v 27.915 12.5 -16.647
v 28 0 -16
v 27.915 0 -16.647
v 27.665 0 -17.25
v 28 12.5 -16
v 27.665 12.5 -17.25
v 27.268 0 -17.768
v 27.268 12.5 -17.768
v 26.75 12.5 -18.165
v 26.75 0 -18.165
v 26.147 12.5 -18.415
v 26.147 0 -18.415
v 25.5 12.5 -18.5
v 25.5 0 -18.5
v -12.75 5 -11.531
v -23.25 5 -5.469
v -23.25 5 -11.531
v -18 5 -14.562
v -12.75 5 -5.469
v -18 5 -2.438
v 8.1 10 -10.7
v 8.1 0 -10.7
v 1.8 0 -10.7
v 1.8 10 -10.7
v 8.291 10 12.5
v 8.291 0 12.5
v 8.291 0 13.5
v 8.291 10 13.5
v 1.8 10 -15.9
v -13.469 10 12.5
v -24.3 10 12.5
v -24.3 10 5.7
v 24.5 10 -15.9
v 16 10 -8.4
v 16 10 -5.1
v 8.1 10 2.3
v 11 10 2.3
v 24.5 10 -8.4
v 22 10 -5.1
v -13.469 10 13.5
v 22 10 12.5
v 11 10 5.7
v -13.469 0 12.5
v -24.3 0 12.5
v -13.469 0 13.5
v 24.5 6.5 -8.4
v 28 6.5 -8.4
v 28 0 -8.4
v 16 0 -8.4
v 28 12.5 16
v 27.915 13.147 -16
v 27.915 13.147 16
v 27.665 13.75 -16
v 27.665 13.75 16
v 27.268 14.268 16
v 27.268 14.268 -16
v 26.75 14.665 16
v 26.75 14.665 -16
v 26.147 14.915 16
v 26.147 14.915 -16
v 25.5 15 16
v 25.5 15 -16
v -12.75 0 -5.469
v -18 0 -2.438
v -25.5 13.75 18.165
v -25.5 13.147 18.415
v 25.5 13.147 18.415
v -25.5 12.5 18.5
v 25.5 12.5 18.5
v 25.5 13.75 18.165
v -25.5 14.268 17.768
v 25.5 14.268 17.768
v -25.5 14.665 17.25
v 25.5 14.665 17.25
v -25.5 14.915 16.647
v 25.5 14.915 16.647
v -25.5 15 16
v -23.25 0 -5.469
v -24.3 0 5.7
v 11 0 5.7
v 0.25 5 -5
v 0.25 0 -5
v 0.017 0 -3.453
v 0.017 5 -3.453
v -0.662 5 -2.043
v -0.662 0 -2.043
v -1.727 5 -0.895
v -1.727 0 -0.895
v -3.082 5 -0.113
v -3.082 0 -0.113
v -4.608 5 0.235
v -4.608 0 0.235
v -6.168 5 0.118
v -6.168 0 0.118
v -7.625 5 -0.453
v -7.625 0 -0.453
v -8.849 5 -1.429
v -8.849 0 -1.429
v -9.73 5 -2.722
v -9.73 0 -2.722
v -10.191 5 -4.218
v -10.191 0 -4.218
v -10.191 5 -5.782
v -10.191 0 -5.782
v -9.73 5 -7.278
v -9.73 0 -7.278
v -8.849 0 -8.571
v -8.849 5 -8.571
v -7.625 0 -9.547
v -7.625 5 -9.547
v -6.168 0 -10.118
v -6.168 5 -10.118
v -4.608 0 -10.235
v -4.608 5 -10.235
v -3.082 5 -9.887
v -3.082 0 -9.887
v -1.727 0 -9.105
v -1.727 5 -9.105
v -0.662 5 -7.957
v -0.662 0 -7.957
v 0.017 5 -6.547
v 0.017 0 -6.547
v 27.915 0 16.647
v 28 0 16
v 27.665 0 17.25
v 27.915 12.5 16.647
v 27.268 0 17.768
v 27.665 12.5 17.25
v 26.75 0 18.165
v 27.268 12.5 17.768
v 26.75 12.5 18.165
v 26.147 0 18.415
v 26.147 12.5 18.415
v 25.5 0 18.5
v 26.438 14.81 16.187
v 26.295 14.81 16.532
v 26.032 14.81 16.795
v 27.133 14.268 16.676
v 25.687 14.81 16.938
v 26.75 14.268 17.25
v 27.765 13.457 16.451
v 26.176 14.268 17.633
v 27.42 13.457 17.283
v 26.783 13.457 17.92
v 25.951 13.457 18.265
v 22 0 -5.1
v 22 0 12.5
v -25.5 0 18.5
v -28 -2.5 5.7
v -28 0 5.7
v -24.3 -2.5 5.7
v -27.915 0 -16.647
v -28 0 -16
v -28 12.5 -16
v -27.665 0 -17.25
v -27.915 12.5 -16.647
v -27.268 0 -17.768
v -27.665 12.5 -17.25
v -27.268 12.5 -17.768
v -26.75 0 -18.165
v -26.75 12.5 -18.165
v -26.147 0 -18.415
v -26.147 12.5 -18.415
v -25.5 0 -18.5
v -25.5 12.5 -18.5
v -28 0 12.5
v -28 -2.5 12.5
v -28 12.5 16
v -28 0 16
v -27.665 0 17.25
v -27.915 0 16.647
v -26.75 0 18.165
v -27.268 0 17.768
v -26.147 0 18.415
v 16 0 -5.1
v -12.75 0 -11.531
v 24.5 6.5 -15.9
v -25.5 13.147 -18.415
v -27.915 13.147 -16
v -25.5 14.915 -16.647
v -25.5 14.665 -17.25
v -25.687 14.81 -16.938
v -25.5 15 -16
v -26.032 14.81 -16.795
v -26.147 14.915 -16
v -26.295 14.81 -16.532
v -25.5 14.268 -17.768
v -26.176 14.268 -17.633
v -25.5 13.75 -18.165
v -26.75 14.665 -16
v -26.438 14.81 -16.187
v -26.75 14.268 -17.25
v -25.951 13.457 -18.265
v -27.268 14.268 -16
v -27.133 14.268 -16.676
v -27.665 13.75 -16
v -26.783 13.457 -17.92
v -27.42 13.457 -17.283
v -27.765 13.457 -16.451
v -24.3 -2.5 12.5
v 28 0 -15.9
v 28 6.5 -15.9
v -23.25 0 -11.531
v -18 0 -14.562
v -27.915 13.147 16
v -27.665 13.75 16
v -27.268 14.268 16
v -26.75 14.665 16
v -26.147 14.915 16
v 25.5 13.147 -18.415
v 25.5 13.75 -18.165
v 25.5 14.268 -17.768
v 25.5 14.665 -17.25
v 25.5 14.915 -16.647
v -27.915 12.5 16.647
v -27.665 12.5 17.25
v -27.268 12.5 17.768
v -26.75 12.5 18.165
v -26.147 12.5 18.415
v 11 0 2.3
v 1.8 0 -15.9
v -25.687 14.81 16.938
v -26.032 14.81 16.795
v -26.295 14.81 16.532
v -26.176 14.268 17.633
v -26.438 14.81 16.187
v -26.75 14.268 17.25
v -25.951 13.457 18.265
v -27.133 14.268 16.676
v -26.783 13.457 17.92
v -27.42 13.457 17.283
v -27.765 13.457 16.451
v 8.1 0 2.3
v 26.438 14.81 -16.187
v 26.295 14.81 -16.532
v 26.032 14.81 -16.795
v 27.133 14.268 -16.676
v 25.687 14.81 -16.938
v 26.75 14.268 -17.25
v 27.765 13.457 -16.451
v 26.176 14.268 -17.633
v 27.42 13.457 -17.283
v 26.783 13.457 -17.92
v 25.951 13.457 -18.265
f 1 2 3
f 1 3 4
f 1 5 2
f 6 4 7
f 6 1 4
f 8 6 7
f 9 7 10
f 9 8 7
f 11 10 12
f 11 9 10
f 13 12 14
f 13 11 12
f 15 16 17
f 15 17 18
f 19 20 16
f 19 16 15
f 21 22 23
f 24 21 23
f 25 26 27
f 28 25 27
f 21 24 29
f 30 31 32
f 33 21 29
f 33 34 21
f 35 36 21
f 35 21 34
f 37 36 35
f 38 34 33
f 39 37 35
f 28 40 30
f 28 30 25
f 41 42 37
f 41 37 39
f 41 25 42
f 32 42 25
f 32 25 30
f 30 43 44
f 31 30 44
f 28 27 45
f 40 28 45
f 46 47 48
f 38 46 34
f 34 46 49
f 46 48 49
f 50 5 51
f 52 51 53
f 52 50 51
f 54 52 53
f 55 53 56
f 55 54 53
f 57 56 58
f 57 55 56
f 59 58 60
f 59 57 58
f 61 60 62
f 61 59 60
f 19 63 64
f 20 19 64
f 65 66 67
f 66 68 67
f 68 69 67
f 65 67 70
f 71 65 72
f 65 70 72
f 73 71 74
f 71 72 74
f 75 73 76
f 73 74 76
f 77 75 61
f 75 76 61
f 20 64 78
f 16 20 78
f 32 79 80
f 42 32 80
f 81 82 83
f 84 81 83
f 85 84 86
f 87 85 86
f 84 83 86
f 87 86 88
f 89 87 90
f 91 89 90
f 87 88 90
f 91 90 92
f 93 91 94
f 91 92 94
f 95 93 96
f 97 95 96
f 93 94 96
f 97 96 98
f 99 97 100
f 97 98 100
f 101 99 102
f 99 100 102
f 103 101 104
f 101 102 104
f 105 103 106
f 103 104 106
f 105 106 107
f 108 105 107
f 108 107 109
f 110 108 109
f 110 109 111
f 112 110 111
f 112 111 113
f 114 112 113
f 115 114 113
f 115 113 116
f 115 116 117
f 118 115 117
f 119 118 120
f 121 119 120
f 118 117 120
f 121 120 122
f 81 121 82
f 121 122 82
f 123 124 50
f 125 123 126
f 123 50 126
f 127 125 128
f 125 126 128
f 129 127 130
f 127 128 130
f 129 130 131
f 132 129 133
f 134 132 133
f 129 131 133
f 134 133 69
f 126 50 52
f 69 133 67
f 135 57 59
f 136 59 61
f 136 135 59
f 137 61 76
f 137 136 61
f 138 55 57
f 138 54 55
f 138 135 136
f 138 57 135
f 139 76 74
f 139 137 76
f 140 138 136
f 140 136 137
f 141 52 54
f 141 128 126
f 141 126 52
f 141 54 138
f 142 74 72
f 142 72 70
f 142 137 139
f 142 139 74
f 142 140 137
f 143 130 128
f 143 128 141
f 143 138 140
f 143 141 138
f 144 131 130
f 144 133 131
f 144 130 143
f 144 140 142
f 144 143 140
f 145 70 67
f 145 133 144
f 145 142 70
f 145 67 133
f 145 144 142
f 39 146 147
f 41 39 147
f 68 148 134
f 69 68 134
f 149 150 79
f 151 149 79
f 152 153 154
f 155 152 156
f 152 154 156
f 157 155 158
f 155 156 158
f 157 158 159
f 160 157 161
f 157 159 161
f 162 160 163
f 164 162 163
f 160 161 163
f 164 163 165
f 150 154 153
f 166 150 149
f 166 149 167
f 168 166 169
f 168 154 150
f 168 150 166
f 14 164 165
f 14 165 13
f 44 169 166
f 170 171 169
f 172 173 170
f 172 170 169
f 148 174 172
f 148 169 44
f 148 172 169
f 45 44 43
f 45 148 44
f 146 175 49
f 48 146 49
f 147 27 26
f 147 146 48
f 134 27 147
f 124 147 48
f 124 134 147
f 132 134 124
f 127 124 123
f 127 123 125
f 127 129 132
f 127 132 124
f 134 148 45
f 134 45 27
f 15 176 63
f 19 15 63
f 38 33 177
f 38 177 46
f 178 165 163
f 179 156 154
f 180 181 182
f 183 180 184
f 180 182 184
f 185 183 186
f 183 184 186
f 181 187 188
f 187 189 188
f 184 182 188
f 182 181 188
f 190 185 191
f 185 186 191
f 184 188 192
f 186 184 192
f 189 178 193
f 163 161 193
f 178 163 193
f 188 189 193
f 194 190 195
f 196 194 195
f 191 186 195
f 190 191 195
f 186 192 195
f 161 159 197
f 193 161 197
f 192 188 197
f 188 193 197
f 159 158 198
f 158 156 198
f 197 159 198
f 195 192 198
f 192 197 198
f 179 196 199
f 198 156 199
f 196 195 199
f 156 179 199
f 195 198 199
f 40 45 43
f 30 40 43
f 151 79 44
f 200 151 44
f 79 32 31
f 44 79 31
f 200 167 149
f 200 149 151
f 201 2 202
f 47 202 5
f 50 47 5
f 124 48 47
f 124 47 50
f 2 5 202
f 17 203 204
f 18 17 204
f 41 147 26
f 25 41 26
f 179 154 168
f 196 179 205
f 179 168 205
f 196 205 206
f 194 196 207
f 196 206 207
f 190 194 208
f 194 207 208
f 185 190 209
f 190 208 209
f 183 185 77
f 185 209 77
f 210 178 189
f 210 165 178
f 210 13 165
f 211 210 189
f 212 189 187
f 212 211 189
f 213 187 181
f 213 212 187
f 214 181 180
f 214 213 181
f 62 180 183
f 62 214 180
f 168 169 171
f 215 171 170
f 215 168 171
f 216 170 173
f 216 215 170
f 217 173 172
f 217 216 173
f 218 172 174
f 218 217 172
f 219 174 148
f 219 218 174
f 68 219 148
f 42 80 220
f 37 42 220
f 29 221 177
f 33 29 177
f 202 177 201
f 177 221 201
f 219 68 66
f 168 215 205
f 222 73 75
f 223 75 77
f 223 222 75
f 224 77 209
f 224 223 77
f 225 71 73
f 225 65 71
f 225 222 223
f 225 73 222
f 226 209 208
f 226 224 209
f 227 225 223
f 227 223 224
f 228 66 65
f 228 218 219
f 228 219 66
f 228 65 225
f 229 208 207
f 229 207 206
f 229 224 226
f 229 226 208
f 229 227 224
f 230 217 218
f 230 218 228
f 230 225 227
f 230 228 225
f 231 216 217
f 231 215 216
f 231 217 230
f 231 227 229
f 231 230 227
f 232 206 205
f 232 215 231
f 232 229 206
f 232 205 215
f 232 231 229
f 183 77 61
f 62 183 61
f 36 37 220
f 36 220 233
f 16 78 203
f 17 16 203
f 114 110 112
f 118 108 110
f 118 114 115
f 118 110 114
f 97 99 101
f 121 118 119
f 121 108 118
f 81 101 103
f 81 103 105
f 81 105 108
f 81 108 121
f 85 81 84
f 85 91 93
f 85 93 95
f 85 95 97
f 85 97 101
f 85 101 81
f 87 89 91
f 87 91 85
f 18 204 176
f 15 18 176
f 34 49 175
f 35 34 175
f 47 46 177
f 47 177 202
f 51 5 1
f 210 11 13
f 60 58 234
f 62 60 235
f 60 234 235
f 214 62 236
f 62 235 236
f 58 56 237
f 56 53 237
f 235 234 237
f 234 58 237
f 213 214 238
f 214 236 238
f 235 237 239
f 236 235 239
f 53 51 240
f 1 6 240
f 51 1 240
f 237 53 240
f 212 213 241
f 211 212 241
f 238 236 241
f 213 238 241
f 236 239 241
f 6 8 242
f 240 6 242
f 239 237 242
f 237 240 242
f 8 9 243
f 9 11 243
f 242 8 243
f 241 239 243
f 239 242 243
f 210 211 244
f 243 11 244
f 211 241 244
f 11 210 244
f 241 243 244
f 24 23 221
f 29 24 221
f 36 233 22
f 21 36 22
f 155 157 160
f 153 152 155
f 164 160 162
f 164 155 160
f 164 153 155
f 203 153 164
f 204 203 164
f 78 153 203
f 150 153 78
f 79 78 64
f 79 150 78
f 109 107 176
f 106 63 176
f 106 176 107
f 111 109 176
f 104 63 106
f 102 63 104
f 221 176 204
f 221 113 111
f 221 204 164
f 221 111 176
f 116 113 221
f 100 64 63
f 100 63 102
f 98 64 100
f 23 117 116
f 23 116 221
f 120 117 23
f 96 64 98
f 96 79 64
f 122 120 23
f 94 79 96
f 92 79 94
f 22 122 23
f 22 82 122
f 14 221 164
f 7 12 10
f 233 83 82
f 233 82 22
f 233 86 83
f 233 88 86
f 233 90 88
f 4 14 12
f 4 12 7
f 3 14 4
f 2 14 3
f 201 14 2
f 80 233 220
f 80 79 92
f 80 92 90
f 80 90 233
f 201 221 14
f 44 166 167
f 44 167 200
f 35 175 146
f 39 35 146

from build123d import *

# Parameters (mm, degrees)
F0_W      = 56
F0_H      = 37
F1_DEPTH  = 15
F3_DEPTH  = 10
F4_W      = 3.7
F4_H      = 6.8
F5_DEPTH  = 2.5
F7_DEPTH  = 5
F8_W      = 3.5
F8_H      = 7.5
F9_DEPTH  = 3.5
F10_R     = 2.5
F11_R     = 5.25
F12_DEPTH = 5


with BuildPart() as f1:
    # F0 (on Front) → F1 (new body)
    with BuildSketch(Plane.XZ):
        Rectangle(F0_W, F0_H)
    extrude(amount=-F1_DEPTH)

    # F2 (on face) → F3 (cut)
    with BuildSketch(Plane.XZ):
        Polygon((-13.468998, 12.5), (-24.3, 12.5), (-24.3, 5.7), (11, 5.7), (11, 2.3), (8.1, 2.3), (8.1, -10.7), (1.8, -10.7), (1.8, -15.9), (28, -15.9), (28, -8.4), (16, -8.4), (16, -5.1), (22, -5.1), (22, 12.5), (8.290843, 12.5), (8.290843, 13.5), (-9.038461, 13.5), (-13.468998, 13.5), align=None)
    extrude(amount=-F3_DEPTH, mode=Mode.SUBTRACT)

    # F4 (on face) → F5 (join)
    with BuildSketch(Plane.XZ):
        with Locations((-26.15, 9.1)):
            Rectangle(F4_W, F4_H)
    extrude(amount=F5_DEPTH)

    # F6 (on face) → F7 (cut)
    with BuildSketch(Plane.XZ):
        Polygon((-23.25, -5.468911), (-23.25, -11.531089), (-18, -14.562178), (-12.75, -11.531089), (-12.75, -5.468911), (-18, -2.437822), align=None)
    extrude(amount=-F7_DEPTH, mode=Mode.SUBTRACT)

    # F8 (on face) → F9 (join)
    with BuildSketch(Plane.XZ.offset(-10)):
        with Locations((26.25, -12.15)):
            Rectangle(F8_W, F8_H)
    extrude(amount=F9_DEPTH)

    # F10
    f10_edges = [f1.edges().sort_by_distance(p)[0] for p in [
        (28, 7.5, -18.5),
        (28, 7.5, 18.5),
        (-28, 7.5, 18.5),
        (-28, 7.5, -18.5),
        (28, 15, 0),
        (0, 15, 18.5),
        (0, 15, -18.5),
        (-28, 15, 0),
    ]]
    fillet(f10_edges, radius=F10_R)

    # F11 (on face) → F12 (cut)
    with BuildSketch(Plane.XZ):
        with Locations((-5, -5)):
            Circle(F11_R)
    extrude(amount=-F12_DEPTH, mode=Mode.SUBTRACT)


solid = f1.part
